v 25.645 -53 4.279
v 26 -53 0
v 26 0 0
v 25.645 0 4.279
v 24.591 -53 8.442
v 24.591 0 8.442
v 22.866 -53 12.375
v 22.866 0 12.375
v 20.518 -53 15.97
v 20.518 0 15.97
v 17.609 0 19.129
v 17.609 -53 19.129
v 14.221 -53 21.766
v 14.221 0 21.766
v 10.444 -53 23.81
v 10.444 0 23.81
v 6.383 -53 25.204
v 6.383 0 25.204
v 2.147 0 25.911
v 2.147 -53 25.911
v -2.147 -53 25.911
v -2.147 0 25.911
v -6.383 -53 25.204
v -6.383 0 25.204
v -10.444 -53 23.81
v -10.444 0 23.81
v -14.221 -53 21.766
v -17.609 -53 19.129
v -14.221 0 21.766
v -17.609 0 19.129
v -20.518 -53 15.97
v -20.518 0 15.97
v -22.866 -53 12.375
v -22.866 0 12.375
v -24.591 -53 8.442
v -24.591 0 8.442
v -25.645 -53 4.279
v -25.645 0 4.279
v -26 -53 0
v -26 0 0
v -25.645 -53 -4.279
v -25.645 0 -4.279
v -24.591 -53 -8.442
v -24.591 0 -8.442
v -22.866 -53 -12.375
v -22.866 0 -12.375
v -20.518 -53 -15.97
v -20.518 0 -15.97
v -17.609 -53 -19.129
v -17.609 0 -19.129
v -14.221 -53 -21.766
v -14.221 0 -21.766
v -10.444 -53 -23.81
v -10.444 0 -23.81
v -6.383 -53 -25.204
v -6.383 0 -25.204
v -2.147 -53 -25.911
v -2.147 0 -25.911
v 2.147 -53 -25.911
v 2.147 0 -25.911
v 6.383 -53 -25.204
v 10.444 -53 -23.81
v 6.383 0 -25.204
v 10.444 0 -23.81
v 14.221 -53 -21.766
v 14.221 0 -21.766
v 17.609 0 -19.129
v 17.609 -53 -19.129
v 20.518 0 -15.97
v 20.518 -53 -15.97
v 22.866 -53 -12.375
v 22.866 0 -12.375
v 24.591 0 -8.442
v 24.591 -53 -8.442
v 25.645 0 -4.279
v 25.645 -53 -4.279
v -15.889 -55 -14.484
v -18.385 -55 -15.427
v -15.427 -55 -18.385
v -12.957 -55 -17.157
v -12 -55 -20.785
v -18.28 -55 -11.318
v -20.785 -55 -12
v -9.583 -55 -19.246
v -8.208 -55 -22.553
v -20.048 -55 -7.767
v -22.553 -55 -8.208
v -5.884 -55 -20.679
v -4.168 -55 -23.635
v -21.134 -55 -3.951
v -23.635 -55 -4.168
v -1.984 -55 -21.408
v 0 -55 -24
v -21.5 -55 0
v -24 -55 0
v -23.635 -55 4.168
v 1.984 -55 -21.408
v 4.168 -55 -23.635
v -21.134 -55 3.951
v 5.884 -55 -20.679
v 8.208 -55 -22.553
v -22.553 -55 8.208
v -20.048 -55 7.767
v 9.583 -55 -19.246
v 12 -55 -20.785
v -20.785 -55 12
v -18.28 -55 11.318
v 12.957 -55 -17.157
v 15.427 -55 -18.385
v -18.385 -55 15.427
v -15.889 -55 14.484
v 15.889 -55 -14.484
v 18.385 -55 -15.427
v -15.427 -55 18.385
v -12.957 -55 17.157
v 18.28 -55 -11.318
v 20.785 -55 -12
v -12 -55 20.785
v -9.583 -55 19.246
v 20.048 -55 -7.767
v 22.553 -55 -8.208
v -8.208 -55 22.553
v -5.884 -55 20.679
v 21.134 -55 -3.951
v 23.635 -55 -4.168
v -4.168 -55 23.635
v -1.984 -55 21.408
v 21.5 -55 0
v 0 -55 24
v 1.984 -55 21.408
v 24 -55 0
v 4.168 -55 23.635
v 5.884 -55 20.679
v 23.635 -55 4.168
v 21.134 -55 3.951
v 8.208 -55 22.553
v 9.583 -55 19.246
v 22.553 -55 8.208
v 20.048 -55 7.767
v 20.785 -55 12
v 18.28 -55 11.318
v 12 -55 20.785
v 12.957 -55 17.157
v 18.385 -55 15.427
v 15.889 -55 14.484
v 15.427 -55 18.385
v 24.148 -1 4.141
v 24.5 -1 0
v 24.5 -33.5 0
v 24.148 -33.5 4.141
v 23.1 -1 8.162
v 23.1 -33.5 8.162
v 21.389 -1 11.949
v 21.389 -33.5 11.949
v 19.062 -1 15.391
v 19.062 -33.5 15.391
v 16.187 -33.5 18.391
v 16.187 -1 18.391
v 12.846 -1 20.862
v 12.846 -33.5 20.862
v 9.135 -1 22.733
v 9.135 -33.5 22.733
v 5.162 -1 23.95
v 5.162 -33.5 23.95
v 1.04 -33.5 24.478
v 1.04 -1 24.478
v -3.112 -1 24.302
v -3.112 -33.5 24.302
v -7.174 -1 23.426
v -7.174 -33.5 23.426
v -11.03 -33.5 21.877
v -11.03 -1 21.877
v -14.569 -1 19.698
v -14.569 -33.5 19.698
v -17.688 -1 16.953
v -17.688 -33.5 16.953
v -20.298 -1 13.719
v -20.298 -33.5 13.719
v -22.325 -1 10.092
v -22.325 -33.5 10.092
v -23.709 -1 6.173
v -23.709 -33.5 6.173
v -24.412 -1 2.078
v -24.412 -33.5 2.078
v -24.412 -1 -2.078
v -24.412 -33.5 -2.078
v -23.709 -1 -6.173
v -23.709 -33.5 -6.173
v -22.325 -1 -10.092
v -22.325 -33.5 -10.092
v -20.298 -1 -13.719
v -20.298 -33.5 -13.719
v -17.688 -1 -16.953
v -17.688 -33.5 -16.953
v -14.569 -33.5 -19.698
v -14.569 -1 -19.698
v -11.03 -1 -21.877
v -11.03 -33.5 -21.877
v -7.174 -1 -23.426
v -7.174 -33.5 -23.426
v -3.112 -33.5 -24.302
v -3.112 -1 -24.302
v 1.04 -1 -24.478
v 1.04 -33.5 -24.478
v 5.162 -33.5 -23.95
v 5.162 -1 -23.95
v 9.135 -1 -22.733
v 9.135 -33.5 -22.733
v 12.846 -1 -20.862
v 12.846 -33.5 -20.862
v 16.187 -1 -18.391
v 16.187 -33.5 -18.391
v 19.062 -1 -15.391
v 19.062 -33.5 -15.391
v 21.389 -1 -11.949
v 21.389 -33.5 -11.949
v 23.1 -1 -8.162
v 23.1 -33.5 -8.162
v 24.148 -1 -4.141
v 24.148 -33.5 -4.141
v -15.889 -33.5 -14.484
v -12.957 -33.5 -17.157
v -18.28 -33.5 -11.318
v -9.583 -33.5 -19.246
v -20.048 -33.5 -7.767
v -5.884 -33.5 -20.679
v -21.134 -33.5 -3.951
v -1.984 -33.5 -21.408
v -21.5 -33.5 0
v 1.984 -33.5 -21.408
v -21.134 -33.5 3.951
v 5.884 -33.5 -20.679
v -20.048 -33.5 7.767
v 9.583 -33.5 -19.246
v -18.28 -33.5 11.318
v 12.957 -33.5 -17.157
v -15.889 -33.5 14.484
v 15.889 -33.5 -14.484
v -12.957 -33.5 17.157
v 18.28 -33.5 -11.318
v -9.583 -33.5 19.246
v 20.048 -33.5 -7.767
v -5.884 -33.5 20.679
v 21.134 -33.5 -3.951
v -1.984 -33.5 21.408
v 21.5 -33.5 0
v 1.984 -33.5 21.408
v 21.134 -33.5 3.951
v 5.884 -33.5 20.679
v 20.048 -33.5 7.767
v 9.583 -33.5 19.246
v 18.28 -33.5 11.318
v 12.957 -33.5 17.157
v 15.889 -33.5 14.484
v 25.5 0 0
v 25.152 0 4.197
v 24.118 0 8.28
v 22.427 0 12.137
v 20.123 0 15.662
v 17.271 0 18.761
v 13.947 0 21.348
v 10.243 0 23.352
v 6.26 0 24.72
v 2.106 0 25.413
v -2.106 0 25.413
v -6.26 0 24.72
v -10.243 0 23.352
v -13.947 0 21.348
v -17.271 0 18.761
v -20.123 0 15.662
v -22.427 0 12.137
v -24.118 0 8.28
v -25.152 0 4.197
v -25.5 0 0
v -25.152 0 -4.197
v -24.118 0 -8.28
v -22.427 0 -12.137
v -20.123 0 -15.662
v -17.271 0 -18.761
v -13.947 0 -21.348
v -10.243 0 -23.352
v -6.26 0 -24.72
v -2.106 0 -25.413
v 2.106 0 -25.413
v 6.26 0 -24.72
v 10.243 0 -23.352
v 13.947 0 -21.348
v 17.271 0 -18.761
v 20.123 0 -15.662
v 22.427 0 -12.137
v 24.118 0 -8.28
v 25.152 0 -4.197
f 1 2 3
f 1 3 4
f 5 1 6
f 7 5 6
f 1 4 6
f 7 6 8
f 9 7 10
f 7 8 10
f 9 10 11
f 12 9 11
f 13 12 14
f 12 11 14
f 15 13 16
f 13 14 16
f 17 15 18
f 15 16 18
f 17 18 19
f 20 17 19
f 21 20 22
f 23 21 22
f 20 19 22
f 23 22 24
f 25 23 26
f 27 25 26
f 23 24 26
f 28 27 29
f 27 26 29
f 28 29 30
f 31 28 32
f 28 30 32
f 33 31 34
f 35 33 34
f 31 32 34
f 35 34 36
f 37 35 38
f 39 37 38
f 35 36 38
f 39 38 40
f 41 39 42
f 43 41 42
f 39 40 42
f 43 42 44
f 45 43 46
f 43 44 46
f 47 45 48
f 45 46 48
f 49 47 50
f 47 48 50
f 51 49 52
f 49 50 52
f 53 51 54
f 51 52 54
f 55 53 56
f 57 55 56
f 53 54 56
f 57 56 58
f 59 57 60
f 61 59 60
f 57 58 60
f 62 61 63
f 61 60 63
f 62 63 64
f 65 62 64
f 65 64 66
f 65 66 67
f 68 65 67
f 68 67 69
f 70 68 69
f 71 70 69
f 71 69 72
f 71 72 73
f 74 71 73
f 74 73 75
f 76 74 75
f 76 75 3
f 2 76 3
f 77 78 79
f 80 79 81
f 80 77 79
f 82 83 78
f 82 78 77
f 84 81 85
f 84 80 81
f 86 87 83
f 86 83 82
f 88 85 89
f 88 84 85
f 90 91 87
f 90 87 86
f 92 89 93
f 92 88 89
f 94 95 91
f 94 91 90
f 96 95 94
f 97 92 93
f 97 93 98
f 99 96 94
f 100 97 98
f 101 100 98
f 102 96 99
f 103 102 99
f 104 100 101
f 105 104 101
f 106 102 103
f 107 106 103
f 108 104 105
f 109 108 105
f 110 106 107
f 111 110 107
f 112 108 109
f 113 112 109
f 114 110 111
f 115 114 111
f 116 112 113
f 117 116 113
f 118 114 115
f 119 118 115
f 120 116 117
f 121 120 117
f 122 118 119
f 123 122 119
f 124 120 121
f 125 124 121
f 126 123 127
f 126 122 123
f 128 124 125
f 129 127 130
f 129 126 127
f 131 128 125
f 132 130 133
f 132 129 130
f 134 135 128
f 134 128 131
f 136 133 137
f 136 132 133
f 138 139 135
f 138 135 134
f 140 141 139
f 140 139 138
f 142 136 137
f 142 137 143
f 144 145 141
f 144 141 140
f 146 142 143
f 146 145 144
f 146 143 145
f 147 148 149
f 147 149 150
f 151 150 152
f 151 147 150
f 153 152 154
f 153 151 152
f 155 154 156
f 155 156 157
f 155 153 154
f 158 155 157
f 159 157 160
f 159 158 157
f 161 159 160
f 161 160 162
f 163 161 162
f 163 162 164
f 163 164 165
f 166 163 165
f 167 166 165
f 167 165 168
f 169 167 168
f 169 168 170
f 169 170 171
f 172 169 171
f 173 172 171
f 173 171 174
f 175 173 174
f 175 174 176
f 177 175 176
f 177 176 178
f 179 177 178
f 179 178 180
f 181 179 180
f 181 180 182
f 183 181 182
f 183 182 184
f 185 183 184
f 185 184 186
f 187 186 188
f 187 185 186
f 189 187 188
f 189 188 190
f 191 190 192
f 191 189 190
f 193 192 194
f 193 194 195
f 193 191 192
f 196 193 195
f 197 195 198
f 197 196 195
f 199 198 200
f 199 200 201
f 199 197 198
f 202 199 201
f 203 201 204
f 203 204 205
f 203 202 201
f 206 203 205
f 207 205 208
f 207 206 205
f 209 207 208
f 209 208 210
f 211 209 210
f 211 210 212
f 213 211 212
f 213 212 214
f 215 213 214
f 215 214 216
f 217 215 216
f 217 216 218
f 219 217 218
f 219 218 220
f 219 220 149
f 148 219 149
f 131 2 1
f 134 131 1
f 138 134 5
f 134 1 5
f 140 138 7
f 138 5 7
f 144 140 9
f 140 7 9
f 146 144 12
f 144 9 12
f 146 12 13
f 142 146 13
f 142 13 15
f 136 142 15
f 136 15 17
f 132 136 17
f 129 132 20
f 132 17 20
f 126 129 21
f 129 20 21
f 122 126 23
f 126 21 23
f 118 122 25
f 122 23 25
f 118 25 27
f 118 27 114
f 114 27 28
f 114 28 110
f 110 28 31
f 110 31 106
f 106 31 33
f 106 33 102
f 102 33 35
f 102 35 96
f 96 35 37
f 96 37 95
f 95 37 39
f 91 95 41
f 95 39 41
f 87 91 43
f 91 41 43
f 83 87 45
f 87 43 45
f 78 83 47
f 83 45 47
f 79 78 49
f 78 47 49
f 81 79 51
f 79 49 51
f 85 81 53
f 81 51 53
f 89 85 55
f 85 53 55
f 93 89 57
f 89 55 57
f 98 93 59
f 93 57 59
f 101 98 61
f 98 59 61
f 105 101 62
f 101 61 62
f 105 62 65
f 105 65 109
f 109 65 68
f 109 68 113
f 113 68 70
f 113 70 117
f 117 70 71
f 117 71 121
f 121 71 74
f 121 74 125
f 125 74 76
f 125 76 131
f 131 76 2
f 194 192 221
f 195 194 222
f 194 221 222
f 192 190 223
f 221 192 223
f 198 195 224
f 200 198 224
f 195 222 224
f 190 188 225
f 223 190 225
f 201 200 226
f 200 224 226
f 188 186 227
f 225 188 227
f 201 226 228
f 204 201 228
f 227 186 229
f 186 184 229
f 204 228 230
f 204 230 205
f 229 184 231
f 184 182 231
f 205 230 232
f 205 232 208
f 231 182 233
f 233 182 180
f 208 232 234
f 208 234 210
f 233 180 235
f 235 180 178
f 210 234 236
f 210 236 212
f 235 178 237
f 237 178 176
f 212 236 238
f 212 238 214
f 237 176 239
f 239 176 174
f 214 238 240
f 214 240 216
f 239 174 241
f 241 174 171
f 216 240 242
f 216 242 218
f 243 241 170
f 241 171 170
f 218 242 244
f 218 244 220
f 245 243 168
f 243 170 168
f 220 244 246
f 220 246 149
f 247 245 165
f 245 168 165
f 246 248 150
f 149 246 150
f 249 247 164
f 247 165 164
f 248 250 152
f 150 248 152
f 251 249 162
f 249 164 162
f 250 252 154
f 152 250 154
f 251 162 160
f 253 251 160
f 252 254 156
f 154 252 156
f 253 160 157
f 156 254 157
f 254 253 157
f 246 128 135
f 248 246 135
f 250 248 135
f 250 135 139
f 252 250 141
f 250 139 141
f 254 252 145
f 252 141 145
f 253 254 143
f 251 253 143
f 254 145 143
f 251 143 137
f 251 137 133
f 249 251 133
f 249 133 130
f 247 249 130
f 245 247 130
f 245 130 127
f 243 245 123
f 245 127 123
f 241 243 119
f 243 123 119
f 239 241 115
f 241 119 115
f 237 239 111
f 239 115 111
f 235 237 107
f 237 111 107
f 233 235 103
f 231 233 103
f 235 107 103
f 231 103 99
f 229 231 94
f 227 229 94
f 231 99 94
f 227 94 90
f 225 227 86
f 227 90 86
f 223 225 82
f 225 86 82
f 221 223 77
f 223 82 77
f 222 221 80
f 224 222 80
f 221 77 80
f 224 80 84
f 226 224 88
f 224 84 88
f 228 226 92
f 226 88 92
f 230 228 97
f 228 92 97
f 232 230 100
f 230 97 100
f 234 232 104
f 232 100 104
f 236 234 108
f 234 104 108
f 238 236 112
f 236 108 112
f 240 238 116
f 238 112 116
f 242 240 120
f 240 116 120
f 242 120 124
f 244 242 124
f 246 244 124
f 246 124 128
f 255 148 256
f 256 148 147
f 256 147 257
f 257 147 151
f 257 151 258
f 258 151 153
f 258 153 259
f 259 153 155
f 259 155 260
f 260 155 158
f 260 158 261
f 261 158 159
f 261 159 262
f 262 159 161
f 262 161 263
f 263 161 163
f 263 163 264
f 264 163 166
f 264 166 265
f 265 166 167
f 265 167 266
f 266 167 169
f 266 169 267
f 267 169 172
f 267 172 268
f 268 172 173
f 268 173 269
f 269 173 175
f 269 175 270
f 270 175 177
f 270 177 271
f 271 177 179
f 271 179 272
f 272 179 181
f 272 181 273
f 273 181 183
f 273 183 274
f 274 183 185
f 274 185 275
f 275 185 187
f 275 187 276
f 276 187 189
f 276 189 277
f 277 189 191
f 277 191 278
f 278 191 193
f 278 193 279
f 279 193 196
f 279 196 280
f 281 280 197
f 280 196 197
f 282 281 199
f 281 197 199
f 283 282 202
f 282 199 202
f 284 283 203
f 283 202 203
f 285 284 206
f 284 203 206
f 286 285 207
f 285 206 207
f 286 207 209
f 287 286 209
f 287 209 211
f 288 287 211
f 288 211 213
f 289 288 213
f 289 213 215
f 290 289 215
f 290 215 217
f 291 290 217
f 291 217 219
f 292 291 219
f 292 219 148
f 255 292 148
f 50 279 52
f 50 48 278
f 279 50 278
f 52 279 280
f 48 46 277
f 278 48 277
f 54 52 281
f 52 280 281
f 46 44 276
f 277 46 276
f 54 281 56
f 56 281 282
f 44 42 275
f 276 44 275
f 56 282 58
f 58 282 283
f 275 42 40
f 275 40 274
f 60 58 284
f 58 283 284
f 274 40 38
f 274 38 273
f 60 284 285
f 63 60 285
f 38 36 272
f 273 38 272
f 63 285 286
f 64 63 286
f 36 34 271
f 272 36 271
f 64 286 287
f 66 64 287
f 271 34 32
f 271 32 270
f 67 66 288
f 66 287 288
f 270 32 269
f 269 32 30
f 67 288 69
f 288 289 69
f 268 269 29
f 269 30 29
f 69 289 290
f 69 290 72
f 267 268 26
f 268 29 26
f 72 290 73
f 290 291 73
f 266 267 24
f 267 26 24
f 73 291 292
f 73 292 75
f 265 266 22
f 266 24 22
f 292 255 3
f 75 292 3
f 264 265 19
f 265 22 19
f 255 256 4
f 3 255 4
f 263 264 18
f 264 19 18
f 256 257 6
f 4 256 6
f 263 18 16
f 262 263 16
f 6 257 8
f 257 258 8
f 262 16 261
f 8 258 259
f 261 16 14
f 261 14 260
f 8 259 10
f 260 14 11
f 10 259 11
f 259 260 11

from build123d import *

# Parameters (mm, degrees)
F0_R     = 26
F0_R_2   = 24.5
F1_DEPTH = 55
F2_R     = 24.5
F2_R_2   = 21.5
F3_DEPTH = 21.5
F4_SIZE  = 2
F5_SIZE  = 1


with BuildPart() as f1:
    # F0 (on Front) → F1 (new body)
    with BuildSketch(Plane.XZ):
        Circle(F0_R)
        Circle(F0_R_2, mode=Mode.SUBTRACT)
    extrude(amount=F1_DEPTH)

    # F2 (on face) → F3 (join)
    with BuildSketch(Plane.XZ.offset(55)):
        Circle(F2_R)
        Circle(F2_R_2, mode=Mode.SUBTRACT)
    extrude(amount=-F3_DEPTH)

    # F4
    f4_edges = [f1.edges().sort_by_distance(p)[0] for p in [
        (-26, -55, 0),
    ]]
    chamfer(f4_edges, length=F4_SIZE)

    # F5
    f5_edges = [f1.edges().sort_by_distance(p)[0] for p in [
        (-24.5, 0, 0),
    ]]
    chamfer(f5_edges, length=F5_SIZE)


solid = f1.part
